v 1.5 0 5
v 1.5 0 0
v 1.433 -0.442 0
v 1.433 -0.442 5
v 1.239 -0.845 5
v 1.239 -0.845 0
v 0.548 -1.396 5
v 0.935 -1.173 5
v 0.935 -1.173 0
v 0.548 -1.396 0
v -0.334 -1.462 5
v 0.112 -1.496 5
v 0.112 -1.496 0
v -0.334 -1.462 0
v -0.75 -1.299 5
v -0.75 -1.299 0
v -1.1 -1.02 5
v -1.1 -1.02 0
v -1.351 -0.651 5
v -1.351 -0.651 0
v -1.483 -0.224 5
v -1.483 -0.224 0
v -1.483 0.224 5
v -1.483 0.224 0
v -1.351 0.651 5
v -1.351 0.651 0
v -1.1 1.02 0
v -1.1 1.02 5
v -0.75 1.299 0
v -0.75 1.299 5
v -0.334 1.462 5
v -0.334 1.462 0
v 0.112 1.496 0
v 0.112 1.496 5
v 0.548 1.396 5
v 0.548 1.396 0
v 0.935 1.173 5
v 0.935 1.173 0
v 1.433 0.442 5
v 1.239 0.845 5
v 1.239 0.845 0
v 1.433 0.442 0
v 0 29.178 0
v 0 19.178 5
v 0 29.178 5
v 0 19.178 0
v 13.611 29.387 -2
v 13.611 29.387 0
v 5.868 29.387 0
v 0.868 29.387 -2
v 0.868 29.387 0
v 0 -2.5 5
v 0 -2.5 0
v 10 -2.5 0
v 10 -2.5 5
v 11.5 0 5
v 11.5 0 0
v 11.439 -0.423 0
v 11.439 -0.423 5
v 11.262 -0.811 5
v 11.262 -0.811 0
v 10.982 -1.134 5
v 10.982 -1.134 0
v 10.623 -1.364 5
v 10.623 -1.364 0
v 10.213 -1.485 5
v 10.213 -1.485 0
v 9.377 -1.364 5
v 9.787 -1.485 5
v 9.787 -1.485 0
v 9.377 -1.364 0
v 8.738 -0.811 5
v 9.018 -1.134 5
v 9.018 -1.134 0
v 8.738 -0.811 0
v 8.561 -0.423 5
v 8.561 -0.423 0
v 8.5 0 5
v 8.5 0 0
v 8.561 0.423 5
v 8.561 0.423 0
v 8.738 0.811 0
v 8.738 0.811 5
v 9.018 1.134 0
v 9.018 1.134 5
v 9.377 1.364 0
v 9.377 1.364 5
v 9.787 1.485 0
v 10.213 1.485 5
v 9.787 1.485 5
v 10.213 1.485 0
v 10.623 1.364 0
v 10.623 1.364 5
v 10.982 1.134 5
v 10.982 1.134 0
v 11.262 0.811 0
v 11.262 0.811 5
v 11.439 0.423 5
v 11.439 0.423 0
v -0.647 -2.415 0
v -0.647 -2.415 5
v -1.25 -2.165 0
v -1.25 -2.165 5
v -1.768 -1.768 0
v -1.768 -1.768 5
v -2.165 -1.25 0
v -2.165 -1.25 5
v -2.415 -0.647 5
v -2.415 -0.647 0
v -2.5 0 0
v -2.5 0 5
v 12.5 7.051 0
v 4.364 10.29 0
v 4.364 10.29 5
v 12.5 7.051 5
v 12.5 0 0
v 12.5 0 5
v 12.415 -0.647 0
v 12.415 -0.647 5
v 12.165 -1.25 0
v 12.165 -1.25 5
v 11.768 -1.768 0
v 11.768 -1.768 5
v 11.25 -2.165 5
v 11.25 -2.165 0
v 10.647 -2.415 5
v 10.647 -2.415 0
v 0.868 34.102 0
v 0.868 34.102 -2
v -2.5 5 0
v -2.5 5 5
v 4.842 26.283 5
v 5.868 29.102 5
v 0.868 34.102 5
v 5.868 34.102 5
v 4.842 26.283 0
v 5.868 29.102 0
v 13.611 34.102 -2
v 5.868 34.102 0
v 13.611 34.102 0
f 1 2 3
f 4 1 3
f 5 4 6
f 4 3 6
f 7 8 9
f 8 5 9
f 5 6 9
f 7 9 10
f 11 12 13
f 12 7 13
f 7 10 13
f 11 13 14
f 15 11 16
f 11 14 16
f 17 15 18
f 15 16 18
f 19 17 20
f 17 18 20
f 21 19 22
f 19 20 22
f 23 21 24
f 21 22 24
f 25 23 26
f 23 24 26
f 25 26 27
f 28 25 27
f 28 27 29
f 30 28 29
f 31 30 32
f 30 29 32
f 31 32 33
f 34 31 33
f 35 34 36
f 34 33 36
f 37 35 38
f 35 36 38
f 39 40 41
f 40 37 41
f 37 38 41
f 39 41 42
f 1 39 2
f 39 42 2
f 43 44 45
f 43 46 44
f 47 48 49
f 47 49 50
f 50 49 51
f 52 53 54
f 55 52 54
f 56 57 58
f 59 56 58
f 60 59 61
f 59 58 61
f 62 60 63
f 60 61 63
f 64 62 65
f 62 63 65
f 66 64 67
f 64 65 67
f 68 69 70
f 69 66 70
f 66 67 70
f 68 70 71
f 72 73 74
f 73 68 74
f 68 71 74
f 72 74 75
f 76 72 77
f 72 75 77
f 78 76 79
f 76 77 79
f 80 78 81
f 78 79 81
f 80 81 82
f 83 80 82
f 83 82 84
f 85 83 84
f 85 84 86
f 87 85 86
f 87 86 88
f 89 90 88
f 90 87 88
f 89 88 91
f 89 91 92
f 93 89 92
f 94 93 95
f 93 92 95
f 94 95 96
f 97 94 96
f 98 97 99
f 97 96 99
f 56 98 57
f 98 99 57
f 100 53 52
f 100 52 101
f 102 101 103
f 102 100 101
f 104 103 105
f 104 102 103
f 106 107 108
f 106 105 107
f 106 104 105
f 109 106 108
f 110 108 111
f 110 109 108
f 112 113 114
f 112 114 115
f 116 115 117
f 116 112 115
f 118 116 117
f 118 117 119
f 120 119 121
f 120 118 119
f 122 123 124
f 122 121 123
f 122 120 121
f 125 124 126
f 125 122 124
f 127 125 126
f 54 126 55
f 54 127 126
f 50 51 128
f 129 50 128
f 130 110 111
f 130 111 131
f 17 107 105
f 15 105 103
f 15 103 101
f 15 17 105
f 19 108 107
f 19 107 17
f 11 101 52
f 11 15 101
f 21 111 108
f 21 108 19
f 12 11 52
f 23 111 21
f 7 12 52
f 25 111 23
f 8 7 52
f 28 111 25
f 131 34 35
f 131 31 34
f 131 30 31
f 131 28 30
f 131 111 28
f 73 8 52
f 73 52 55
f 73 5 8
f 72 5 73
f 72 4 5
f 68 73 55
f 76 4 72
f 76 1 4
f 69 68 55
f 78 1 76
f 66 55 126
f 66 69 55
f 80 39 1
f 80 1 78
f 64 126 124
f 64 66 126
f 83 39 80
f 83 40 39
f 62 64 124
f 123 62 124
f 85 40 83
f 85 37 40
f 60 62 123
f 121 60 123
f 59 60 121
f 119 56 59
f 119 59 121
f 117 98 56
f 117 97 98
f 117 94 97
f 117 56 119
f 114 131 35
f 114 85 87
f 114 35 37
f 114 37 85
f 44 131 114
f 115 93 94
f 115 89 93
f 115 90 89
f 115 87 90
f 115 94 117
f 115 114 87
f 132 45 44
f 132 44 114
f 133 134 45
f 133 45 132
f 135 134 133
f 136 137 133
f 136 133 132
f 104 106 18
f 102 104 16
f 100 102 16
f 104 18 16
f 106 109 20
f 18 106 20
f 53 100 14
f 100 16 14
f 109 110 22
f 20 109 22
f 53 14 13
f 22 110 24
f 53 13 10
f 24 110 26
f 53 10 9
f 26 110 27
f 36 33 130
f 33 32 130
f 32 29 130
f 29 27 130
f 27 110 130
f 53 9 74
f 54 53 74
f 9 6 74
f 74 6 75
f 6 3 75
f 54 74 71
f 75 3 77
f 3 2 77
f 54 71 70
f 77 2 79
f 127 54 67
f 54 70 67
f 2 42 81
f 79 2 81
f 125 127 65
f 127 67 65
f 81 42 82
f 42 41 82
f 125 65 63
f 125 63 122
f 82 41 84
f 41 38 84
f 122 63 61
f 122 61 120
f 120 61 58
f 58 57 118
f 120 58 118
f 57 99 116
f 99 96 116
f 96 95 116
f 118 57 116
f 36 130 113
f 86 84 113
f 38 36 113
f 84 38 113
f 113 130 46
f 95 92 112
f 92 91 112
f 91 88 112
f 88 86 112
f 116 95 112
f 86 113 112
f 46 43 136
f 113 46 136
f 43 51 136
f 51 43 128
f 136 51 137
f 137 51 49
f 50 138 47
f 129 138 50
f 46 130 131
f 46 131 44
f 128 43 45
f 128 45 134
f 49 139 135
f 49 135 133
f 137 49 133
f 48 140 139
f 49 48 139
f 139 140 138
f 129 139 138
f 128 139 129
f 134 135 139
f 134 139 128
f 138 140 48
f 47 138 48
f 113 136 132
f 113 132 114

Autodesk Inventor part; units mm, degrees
ref_plane "YZ Plane" through (0, 0, 0) normal (1, 0, 0) x (0, 1, 0)
ref_plane "XZ Plane" through (0, 0, 0) normal (0, 1, 0) x (-1, 0, 0)
ref_plane "XY Plane" through (0, 0, 0) normal (0, 0, 1) x (1, 0, 0)
sketch "Sketch1" plane through (0, 0, 0) normal (0, 0, 1) x (1, 0, 0)
  line L0 (0, 0) -> (10, 0)
  circle A0 centre (0, 0) radius 1.5
  circle A1 centre (10, 0) radius 1.5
  circle A2 centre (0, 0) radius 2.5
  circle A3 centre (10, 0) radius 2.5
  line L1 (0, -2.5) -> (10, -2.5)
  line L2 (-2.5, 0) -> (-2.5, 5)
  line L3 (-2.5, 5) -> (0, 19.1782)
  line L4 (-2.5, 5) -> (11.8969, 5) construction
  line L5 (0, 19.1782) -> (0, 29.1782)
  line L6 (0, 29.1782) -> (0.8682, 34.1022)
  line L7 (0.8682, 34.1022) -> (5.8682, 34.1022)
  line L8 (5.8682, 34.1022) -> (5.8682, 29.1022)
  line L9 (5.8682, 29.1022) -> (4.8422, 26.2832)
  line L10 (4.8422, 26.2832) -> (4.3644, 10.2903)
  line L11 (4.3644, 10.2903) -> (12.5, 7.0509)
  line L12 (12.5, 7.0509) -> (12.5, 0)
  line L13 (5.8682, 34.1022) -> (14.2847, 34.1022)
  line L14 (14.2847, 34.1022) -> (14.2847, 29.1022)
  line L15 (14.2847, 29.1022) -> (5.8682, 29.1022)
  dimension "d0" = 10
  dimension "d1" = 3
  dimension "d2" = 3
  dimension "d3" = 5
  dimension "d4" = 5
  dimension "d5" = 5
  dimension "d6" = 80
  dimension "d7" = 10
  dimension "d8" = 5
  dimension "d9" = 170
  dimension "d10" = 5
  dimension "d11" = 5
  dimension "d12" = 3
  dimension "d13" = 160
  dimension "d14" = 16
  dimension "d15" = 110
extrude "Extrusion1" add sketch "Sketch1" along normal blind 5 contours A2 | A2 L2 L3 L5 L6 L7 L8 L9 L10 L11 L12 A3 L0 | L0 A3 L1 A2 | A3
sketch "Sketch2" plane through (0, 0, 0) normal (0, 0, -1) x (-1, 0, 0)
  line L0 (-5.8682, 34.1022) -> (-0.8682, 34.1022) projected
  line L1 (-0.8682, 34.1022) -> (-13.6111, 34.1022)
  line L2 (-13.6111, 34.1022) -> (-13.6111, 29.3872)
  line L3 (-13.6111, 29.3872) -> (-0.8682, 29.3872)
  line L4 (-0.8682, 29.3872) -> (-0.8682, 34.1022)
  point P0 (0, 0)
extrude "Extrusion3" add sketch "Sketch2" along normal blind 2
properties part number "gripper"
